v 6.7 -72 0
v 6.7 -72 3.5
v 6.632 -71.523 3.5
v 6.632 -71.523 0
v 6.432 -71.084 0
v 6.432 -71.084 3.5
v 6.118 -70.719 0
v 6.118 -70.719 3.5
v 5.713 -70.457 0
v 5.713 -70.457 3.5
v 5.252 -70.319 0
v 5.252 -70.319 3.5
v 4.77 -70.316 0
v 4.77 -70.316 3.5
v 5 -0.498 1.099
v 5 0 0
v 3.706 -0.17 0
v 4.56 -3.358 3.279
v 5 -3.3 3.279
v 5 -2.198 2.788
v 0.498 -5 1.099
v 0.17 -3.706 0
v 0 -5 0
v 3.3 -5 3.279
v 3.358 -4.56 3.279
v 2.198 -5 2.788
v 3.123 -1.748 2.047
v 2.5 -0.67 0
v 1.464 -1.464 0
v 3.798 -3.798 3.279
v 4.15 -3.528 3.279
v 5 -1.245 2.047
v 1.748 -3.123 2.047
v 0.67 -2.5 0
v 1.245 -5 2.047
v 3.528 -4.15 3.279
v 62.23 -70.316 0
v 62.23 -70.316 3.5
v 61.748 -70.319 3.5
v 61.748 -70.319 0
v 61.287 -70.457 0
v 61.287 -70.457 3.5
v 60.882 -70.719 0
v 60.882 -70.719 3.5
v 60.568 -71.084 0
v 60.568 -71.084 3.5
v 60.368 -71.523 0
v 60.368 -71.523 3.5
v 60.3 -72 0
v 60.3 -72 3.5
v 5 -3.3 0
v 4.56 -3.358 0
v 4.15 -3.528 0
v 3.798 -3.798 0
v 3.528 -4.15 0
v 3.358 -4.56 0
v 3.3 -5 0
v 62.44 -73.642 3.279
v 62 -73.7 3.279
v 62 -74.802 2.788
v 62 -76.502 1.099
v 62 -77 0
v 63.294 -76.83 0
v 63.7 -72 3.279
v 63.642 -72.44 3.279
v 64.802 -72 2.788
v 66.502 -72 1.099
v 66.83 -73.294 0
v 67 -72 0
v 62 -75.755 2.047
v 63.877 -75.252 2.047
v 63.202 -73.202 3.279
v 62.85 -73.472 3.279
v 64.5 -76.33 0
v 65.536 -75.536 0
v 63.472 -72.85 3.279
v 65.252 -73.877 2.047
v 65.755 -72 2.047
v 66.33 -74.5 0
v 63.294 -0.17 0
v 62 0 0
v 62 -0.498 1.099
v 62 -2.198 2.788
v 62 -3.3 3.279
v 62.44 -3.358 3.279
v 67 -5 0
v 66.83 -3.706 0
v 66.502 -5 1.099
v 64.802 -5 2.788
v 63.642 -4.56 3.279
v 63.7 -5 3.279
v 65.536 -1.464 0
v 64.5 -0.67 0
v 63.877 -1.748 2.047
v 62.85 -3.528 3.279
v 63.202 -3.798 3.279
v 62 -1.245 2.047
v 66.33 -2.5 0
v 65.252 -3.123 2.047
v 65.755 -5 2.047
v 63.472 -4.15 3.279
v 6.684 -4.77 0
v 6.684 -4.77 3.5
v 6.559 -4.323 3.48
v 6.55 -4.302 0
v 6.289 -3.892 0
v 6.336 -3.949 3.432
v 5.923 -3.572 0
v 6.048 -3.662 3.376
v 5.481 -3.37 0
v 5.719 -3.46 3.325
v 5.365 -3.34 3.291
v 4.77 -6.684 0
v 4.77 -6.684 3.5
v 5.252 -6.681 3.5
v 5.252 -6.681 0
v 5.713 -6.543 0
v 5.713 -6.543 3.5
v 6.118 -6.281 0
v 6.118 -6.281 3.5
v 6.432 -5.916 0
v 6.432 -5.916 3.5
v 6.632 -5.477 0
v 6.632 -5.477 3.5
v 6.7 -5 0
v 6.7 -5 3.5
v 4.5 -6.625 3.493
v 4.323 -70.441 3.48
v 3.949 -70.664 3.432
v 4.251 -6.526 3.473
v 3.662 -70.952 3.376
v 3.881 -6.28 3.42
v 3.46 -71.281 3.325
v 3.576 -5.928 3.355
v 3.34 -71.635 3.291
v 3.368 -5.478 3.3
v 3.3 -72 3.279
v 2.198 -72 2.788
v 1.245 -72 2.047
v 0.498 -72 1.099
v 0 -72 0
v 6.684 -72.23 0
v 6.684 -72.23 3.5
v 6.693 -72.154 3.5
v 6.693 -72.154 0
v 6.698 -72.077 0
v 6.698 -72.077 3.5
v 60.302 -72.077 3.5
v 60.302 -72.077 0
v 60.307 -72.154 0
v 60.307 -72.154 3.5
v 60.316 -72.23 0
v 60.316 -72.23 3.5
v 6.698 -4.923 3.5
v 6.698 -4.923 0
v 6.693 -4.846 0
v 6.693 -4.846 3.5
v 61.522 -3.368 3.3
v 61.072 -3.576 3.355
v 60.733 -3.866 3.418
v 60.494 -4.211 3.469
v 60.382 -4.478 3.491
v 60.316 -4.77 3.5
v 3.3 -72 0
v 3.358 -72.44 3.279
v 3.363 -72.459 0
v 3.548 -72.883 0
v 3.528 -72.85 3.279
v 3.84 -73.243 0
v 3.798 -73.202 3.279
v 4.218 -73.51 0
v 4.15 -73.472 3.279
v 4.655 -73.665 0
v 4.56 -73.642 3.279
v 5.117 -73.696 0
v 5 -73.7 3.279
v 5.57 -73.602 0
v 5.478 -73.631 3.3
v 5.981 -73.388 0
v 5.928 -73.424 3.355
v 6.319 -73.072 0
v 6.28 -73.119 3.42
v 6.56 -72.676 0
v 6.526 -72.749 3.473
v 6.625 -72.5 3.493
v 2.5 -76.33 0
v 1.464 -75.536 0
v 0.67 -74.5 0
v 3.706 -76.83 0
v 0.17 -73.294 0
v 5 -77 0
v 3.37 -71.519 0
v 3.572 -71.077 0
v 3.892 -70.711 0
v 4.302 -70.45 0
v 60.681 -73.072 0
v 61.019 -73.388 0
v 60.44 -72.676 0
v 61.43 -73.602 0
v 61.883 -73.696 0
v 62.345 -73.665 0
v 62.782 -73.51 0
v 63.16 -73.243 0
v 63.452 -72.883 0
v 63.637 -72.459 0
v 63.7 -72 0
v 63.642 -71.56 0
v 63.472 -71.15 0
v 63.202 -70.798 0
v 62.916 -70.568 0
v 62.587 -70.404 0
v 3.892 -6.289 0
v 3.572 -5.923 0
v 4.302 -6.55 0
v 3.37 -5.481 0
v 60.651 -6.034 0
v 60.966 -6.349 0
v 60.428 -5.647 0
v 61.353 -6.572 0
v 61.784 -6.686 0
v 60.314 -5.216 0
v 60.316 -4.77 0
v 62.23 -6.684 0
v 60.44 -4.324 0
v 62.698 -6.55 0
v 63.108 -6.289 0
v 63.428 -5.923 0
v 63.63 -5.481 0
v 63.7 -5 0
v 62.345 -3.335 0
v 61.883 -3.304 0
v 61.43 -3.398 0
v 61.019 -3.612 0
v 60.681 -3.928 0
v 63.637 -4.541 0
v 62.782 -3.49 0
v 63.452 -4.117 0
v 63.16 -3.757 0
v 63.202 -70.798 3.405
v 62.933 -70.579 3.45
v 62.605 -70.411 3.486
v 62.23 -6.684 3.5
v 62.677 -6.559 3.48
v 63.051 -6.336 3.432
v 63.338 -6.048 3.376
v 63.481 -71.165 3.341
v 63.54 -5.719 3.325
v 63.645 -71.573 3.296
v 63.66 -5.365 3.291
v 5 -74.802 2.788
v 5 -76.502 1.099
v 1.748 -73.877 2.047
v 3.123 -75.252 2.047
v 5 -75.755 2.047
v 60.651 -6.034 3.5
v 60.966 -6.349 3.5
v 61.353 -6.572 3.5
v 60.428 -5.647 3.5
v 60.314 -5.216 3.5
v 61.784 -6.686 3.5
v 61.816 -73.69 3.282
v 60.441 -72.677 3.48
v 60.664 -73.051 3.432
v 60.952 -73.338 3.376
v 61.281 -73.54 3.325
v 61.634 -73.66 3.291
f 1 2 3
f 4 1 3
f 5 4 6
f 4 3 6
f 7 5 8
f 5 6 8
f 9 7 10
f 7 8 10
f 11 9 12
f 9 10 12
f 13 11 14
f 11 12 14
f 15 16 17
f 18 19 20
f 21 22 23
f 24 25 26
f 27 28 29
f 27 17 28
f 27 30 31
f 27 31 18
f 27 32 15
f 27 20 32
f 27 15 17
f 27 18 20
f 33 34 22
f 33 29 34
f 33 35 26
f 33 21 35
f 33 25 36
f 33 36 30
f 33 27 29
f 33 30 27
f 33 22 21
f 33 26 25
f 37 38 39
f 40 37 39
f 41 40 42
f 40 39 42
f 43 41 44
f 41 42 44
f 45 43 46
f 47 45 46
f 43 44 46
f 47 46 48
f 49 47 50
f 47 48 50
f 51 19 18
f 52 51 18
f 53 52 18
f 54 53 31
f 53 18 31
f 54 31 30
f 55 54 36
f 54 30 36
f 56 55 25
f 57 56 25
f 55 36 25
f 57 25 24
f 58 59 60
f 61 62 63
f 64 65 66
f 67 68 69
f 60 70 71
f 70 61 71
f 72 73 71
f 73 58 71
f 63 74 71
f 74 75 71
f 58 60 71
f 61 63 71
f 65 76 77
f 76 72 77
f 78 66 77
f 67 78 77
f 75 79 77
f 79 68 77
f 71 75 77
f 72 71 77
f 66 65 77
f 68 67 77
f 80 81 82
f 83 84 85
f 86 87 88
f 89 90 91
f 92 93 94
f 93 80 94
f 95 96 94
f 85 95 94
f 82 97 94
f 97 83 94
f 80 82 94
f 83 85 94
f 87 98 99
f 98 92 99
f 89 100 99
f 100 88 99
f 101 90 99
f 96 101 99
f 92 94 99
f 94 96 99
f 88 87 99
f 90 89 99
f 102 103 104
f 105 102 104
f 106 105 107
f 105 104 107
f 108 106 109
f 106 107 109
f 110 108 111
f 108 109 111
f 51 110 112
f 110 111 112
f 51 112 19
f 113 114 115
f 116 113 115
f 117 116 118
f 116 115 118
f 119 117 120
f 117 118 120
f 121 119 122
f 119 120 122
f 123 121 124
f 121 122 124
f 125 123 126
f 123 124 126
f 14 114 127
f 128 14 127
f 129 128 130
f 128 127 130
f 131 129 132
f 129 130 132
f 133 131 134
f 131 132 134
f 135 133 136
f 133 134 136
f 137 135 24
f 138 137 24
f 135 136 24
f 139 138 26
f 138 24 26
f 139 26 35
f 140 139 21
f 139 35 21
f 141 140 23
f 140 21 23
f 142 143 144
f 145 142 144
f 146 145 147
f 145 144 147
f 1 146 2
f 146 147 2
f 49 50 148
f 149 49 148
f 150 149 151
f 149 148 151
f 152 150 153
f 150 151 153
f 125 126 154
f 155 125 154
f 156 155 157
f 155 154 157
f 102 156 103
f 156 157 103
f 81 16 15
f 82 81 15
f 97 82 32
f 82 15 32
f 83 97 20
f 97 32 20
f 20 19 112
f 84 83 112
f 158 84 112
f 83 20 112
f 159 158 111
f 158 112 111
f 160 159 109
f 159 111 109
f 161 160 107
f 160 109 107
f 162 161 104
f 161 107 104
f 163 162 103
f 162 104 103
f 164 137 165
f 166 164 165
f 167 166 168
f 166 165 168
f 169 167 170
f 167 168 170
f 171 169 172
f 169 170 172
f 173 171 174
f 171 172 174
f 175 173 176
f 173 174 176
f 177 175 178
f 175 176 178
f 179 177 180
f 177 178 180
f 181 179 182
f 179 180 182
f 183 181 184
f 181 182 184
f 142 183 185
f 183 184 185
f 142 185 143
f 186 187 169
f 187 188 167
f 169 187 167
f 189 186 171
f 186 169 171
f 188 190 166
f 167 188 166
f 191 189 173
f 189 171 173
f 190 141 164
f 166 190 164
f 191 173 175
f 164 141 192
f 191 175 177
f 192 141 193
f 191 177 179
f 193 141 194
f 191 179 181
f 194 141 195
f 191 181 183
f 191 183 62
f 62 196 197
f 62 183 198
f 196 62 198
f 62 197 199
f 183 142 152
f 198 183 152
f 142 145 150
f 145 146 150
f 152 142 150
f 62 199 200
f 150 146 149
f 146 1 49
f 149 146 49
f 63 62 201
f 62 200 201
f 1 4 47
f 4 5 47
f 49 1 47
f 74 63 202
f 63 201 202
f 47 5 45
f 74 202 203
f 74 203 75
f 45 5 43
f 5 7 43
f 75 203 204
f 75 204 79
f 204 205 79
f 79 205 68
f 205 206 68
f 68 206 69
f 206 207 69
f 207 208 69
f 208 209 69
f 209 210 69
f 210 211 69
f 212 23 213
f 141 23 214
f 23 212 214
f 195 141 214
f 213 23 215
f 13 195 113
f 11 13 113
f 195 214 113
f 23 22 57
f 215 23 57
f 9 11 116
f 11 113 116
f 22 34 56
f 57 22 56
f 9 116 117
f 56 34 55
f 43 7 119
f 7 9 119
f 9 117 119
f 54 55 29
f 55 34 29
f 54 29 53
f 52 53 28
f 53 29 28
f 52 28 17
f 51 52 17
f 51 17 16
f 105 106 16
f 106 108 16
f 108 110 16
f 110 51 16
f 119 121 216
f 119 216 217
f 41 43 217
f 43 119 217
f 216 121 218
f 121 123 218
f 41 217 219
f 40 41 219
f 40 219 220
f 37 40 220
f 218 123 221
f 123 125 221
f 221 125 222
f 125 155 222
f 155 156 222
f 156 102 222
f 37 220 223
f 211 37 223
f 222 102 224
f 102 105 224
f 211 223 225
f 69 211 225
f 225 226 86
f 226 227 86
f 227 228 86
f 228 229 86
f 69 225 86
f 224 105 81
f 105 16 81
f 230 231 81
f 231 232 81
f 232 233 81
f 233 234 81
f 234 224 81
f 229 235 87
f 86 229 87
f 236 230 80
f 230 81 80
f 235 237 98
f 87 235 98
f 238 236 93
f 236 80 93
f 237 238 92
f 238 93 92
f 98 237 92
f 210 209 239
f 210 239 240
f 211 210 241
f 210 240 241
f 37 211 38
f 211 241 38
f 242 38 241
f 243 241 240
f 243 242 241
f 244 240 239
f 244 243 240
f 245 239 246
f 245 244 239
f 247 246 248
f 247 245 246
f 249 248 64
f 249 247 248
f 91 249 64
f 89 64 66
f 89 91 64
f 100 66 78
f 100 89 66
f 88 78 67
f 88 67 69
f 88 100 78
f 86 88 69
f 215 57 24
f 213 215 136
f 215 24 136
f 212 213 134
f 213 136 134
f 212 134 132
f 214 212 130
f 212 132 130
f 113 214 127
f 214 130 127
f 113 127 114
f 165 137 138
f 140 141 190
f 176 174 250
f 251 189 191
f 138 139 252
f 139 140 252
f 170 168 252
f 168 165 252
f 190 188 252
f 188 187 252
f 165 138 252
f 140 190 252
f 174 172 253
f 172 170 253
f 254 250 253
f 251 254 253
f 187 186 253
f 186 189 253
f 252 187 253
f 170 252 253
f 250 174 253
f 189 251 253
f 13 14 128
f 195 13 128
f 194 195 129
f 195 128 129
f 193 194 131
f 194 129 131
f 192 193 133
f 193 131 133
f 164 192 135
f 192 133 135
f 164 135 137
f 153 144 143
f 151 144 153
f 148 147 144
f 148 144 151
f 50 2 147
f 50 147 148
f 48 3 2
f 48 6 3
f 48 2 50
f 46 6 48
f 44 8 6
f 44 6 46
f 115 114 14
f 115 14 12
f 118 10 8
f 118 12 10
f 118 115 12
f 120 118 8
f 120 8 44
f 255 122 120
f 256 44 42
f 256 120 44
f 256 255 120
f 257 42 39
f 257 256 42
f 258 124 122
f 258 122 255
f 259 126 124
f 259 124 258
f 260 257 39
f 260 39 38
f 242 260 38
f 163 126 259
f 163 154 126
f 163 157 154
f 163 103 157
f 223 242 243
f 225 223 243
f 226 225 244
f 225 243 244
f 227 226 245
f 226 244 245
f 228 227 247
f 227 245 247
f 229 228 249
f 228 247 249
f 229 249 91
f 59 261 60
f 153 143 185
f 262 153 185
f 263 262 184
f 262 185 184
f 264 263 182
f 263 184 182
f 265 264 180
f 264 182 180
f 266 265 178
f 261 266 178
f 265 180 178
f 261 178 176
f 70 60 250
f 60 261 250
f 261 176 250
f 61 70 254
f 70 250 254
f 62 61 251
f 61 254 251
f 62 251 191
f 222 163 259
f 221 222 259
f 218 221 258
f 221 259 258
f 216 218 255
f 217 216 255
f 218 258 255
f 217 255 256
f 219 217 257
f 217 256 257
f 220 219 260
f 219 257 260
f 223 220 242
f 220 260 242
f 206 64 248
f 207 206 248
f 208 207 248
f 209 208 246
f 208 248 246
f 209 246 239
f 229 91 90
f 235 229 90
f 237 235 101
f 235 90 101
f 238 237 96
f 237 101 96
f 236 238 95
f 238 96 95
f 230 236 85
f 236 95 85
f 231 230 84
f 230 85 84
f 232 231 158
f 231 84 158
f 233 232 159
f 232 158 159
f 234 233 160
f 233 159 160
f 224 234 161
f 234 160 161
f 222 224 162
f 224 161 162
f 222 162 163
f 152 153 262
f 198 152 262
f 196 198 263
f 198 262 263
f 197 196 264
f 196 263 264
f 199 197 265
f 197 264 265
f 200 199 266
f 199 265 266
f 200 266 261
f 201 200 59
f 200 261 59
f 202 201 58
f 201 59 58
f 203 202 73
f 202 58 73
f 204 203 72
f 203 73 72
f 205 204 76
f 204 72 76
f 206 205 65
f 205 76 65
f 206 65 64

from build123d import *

# Parameters (mm, degrees)
F0_W         = 67
F0_H         = 77
F1_DEPTH     = 3.5
F2_R         = 5
F3_T1_DEPTH  = 57
F3_T3_DEPTH  = 67
F3_T6_ANGLE  = 90
F3_T8_ANGLE  = 90
F3_T10_ANGLE = 90
F3_T12_ANGLE = 90
F5_DEPTH     = 3.5


# Not quite as in the source:
# - a fillet or chamfer that OpenCascade refuses, or shapes differently, is made with other operations: its cross-section is extruded or revolved along the edge and cut away or added


with BuildPart() as f1:
    # F0 (on Top) → F1 (new body)
    with BuildSketch(Plane.XY):
        with Locations((33.5, -38.5)):
            Rectangle(F0_W, F0_H)
    extrude(amount=F1_DEPTH)

    # F2
    f2_edges = [f1.edges().sort_by_distance(p)[0] for p in [
        (67, -77, 1.75),
        (67, 0, 1.75),
        (0, 0, 1.75),
        (0, -77, 1.75),
    ]]
    fillet(f2_edges, radius=F2_R)

    # F3: fillet of radius 5 on 8 edges, made by hand

    # F3_s2 → F3_t1 (cut)
    with BuildSketch(Plane.YZ.offset(5)):
        with BuildLine():
            ThreePointArc((0, 0), (-1.8116561155, 2.5311288741), (-4.7696960071, 3.5))
            Line((-4.7696960071, 3.5), (0, 3.5))
            Line((0, 3.5), (0, 0))
        make_face()
        with BuildLine():
            ThreePointArc((-72.2303039929, 3.5), (-75.1883438845, 2.5311288741), (-77, 0))
            Line((-77, 0), (-77, 3.5))
            Line((-77, 3.5), (-72.2303039929, 3.5))
        make_face()
    extrude(amount=F3_T1_DEPTH, mode=Mode.SUBTRACT)

    # F3_s4 → F3_t3 (cut)
    with BuildSketch(Plane.XZ.offset(5)):
        with BuildLine():
            ThreePointArc((62.2303039929, 3.5), (65.1883438845, 2.5311288741), (67, 0))
            Line((67, 0), (67, 3.5))
            Line((67, 3.5), (62.2303039929, 3.5))
        make_face()
        with BuildLine():
            ThreePointArc((4.7696960071, 3.5), (1.8116561155, 2.5311288741), (0, 0))
            Line((0, 0), (0, 3.5))
            Line((0, 3.5), (4.7696960071, 3.5))
        make_face()
    extrude(amount=F3_T3_DEPTH, mode=Mode.SUBTRACT)

    # F3_s5 → F3_t6 (revolve, cut)
    with BuildSketch(Plane.YZ.offset(62)):
        with BuildLine():
            ThreePointArc((0, 0), (-1.8116561155, 2.5311288741), (-4.7696960071, 3.5))
            Line((-4.7696960071, 3.5), (0, 3.5))
            Line((0, 3.5), (0, 0))
        make_face()
    revolve(axis=Axis((62, -5, 3.5), (0, 0, -1)), revolution_arc=F3_T6_ANGLE, mode=Mode.SUBTRACT)

    # F3_s7 → F3_t8 (revolve, cut)
    with BuildSketch(Plane.YZ.offset(5)):
        with BuildLine():
            ThreePointArc((0, 0), (-1.8116561155, 2.5311288741), (-4.7696960071, 3.5))
            Line((-4.7696960071, 3.5), (0, 3.5))
            Line((0, 3.5), (0, 0))
        make_face()
    revolve(axis=Axis((5, -5, 3.5), (0, 0, 1)), revolution_arc=F3_T8_ANGLE, mode=Mode.SUBTRACT)

    # F3_s9 → F3_t10 (revolve, cut)
    with BuildSketch(Plane.YZ.offset(62)):
        with BuildLine():
            ThreePointArc((-72.2303039929, 3.5), (-75.1883438845, 2.5311288741), (-77, 0))
            Line((-77, 0), (-77, 3.5))
            Line((-77, 3.5), (-72.2303039929, 3.5))
        make_face()
    revolve(axis=Axis((62, -72, 3.5), (0, 0, 1)), revolution_arc=F3_T10_ANGLE, mode=Mode.SUBTRACT)

    # F3_s11 → F3_t12 (revolve, cut)
    with BuildSketch(Plane.XZ.offset(72)):
        with BuildLine():
            ThreePointArc((4.7696960071, 3.5), (1.8116561155, 2.5311288741), (0, 0))
            Line((0, 0), (0, 3.5))
            Line((0, 3.5), (4.7696960071, 3.5))
        make_face()
    revolve(axis=Axis((5, -72, 3.5), (0, 0, 1)), revolution_arc=F3_T12_ANGLE, mode=Mode.SUBTRACT)

    # F4 (on face) → F5 (cut)
    with BuildSketch(Plane.XY.offset(3.5)):
        with BuildLine():
            Line((62.2303039929, -72), (63.7, -72))
            ThreePointArc((63.7, -72), (63.5705952053, -71.349438165), (63.202081528, -70.797918472))
            Line((63.202081528, -70.797918472), (62.2303039929, -71.7696960071))
            Line((62.2303039929, -71.7696960071), (62.2303039929, -72))
        make_face()
        with BuildLine():
            ThreePointArc((63.202081528, -70.797918472), (62.7556933452, -70.4771974626), (62.2303039929, -70.3156722199))
            Line((62.2303039929, -70.3156722199), (62.2303039929, -71.7696960071))
            Line((62.2303039929, -71.7696960071), (63.202081528, -70.797918472))
        make_face()
        with BuildLine():
            ThreePointArc((62.2303039929, -70.3156722199), (60.8823052268, -70.7190790836), (60.3, -72))
            Line((60.3, -72), (62, -72))
            Line((62, -72), (62.2303039929, -71.7696960071))
            Line((62.2303039929, -71.7696960071), (62.2303039929, -70.3156722199))
        make_face()
        with BuildLine():
            Line((62, -72.2303039929), (60.3156722199, -72.2303039929))
            ThreePointArc((60.3156722199, -72.2303039929), (62.1154183127, -73.6960774195), (63.7, -72))
            Line((63.7, -72), (62.2303039929, -72))
            ThreePointArc((62.2303039929, -72), (62.1628495151, -72.1628495151), (62, -72.2303039929))
        make_face()
        with BuildLine():
            ThreePointArc((60.3, -72), (60.3039225805, -72.1154183127), (60.3156722199, -72.2303039929))
            Line((60.3156722199, -72.2303039929), (62, -72.2303039929))
            ThreePointArc((62, -72.2303039929), (62.1628495151, -72.1628495151), (62.2303039929, -72))
            Line((62.2303039929, -72), (62, -72))
            Line((62, -72), (60.3, -72))
        make_face()
        Polygon((62.2303039929, -71.7696960071), (62, -72), (62.2303039929, -72), align=None)
        with BuildLine():
            Line((4.7696960071, -72), (3.3, -72))
            ThreePointArc((3.3, -72), (4.8845816873, -73.6960774195), (6.6843277801, -72.2303039929))
            Line((6.6843277801, -72.2303039929), (5, -72.2303039929))
            ThreePointArc((5, -72.2303039929), (4.8371504849, -72.1628495151), (4.7696960071, -72))
        make_face()
        with BuildLine():
            ThreePointArc((4.7696960071, -70.3156722199), (3.7190790836, -70.8823052268), (3.3, -72))
            Line((3.3, -72), (4.7696960071, -72))
            Line((4.7696960071, -72), (4.7696960071, -70.3156722199))
        make_face()
        with BuildLine():
            Line((4.7696960071, -70.3156722199), (4.7696960071, -72))
            Line((4.7696960071, -72), (6.7, -72))
            ThreePointArc((6.7, -72), (6.1176947732, -70.7190790836), (4.7696960071, -70.3156722199))
        make_face()
        with BuildLine():
            Line((6.7, -72), (4.7696960071, -72))
            ThreePointArc((4.7696960071, -72), (4.8371504849, -72.1628495151), (5, -72.2303039929))
            Line((5, -72.2303039929), (6.6843277801, -72.2303039929))
            ThreePointArc((6.6843277801, -72.2303039929), (6.6960774195, -72.1154183127), (6.7, -72))
        make_face()
        with BuildLine():
            Line((5, -4.7696960071), (5, -3.3))
            ThreePointArc((5, -3.3), (3.797918472, -3.797918472), (3.3, -5))
            Line((3.3, -5), (4.7696960071, -5))
            ThreePointArc((4.7696960071, -5), (4.8371504849, -4.8371504849), (5, -4.7696960071))
        make_face()
        with BuildLine():
            ThreePointArc((6.6843277801, -4.7696960071), (6.1176947732, -3.7190790836), (5, -3.3))
            Line((5, -3.3), (5, -4.7696960071))
            Line((5, -4.7696960071), (6.6843277801, -4.7696960071))
        make_face()
        with BuildLine():
            Line((6.6843277801, -4.7696960071), (5, -4.7696960071))
            Line((5, -4.7696960071), (5, -5))
            Line((5, -5), (4.7696960071, -5))
            Line((4.7696960071, -5), (4.7696960071, -6.6843277801))
            ThreePointArc((4.7696960071, -6.6843277801), (6.1176947732, -6.2809209164), (6.7, -5))
            ThreePointArc((6.7, -5), (6.6960774195, -4.8845816873), (6.6843277801, -4.7696960071))
        make_face()
        with BuildLine():
            Line((4.7696960071, -5), (3.3, -5))
            ThreePointArc((3.3, -5), (3.7190790836, -6.1176947732), (4.7696960071, -6.6843277801))
            Line((4.7696960071, -6.6843277801), (4.7696960071, -5))
        make_face()
        with BuildLine():
            Line((5, -5), (5, -4.7696960071))
            ThreePointArc((5, -4.7696960071), (4.8371504849, -4.8371504849), (4.7696960071, -5))
            Line((4.7696960071, -5), (5, -5))
        make_face()
        with BuildLine():
            Line((62, -4.7696960071), (60.3156722199, -4.7696960071))
            ThreePointArc((60.3156722199, -4.7696960071), (60.797918472, -6.202081528), (62.2303039929, -6.6843277801))
            Line((62.2303039929, -6.6843277801), (62.2303039929, -5))
            ThreePointArc((62.2303039929, -5), (62.1628495151, -4.8371504849), (62, -4.7696960071))
        make_face()
        with BuildLine():
            ThreePointArc((63.7, -5), (62.1154183127, -3.3039225805), (60.3156722199, -4.7696960071))
            Line((60.3156722199, -4.7696960071), (62, -4.7696960071))
            ThreePointArc((62, -4.7696960071), (62.1628495151, -4.8371504849), (62.2303039929, -5))
            Line((62.2303039929, -5), (62.2303039929, -6.6843277801))
            ThreePointArc((62.2303039929, -6.6843277801), (63.2809209164, -6.1176947732), (63.7, -5))
        make_face()
    extrude(amount=-F5_DEPTH, mode=Mode.SUBTRACT)


solid = f1.part
